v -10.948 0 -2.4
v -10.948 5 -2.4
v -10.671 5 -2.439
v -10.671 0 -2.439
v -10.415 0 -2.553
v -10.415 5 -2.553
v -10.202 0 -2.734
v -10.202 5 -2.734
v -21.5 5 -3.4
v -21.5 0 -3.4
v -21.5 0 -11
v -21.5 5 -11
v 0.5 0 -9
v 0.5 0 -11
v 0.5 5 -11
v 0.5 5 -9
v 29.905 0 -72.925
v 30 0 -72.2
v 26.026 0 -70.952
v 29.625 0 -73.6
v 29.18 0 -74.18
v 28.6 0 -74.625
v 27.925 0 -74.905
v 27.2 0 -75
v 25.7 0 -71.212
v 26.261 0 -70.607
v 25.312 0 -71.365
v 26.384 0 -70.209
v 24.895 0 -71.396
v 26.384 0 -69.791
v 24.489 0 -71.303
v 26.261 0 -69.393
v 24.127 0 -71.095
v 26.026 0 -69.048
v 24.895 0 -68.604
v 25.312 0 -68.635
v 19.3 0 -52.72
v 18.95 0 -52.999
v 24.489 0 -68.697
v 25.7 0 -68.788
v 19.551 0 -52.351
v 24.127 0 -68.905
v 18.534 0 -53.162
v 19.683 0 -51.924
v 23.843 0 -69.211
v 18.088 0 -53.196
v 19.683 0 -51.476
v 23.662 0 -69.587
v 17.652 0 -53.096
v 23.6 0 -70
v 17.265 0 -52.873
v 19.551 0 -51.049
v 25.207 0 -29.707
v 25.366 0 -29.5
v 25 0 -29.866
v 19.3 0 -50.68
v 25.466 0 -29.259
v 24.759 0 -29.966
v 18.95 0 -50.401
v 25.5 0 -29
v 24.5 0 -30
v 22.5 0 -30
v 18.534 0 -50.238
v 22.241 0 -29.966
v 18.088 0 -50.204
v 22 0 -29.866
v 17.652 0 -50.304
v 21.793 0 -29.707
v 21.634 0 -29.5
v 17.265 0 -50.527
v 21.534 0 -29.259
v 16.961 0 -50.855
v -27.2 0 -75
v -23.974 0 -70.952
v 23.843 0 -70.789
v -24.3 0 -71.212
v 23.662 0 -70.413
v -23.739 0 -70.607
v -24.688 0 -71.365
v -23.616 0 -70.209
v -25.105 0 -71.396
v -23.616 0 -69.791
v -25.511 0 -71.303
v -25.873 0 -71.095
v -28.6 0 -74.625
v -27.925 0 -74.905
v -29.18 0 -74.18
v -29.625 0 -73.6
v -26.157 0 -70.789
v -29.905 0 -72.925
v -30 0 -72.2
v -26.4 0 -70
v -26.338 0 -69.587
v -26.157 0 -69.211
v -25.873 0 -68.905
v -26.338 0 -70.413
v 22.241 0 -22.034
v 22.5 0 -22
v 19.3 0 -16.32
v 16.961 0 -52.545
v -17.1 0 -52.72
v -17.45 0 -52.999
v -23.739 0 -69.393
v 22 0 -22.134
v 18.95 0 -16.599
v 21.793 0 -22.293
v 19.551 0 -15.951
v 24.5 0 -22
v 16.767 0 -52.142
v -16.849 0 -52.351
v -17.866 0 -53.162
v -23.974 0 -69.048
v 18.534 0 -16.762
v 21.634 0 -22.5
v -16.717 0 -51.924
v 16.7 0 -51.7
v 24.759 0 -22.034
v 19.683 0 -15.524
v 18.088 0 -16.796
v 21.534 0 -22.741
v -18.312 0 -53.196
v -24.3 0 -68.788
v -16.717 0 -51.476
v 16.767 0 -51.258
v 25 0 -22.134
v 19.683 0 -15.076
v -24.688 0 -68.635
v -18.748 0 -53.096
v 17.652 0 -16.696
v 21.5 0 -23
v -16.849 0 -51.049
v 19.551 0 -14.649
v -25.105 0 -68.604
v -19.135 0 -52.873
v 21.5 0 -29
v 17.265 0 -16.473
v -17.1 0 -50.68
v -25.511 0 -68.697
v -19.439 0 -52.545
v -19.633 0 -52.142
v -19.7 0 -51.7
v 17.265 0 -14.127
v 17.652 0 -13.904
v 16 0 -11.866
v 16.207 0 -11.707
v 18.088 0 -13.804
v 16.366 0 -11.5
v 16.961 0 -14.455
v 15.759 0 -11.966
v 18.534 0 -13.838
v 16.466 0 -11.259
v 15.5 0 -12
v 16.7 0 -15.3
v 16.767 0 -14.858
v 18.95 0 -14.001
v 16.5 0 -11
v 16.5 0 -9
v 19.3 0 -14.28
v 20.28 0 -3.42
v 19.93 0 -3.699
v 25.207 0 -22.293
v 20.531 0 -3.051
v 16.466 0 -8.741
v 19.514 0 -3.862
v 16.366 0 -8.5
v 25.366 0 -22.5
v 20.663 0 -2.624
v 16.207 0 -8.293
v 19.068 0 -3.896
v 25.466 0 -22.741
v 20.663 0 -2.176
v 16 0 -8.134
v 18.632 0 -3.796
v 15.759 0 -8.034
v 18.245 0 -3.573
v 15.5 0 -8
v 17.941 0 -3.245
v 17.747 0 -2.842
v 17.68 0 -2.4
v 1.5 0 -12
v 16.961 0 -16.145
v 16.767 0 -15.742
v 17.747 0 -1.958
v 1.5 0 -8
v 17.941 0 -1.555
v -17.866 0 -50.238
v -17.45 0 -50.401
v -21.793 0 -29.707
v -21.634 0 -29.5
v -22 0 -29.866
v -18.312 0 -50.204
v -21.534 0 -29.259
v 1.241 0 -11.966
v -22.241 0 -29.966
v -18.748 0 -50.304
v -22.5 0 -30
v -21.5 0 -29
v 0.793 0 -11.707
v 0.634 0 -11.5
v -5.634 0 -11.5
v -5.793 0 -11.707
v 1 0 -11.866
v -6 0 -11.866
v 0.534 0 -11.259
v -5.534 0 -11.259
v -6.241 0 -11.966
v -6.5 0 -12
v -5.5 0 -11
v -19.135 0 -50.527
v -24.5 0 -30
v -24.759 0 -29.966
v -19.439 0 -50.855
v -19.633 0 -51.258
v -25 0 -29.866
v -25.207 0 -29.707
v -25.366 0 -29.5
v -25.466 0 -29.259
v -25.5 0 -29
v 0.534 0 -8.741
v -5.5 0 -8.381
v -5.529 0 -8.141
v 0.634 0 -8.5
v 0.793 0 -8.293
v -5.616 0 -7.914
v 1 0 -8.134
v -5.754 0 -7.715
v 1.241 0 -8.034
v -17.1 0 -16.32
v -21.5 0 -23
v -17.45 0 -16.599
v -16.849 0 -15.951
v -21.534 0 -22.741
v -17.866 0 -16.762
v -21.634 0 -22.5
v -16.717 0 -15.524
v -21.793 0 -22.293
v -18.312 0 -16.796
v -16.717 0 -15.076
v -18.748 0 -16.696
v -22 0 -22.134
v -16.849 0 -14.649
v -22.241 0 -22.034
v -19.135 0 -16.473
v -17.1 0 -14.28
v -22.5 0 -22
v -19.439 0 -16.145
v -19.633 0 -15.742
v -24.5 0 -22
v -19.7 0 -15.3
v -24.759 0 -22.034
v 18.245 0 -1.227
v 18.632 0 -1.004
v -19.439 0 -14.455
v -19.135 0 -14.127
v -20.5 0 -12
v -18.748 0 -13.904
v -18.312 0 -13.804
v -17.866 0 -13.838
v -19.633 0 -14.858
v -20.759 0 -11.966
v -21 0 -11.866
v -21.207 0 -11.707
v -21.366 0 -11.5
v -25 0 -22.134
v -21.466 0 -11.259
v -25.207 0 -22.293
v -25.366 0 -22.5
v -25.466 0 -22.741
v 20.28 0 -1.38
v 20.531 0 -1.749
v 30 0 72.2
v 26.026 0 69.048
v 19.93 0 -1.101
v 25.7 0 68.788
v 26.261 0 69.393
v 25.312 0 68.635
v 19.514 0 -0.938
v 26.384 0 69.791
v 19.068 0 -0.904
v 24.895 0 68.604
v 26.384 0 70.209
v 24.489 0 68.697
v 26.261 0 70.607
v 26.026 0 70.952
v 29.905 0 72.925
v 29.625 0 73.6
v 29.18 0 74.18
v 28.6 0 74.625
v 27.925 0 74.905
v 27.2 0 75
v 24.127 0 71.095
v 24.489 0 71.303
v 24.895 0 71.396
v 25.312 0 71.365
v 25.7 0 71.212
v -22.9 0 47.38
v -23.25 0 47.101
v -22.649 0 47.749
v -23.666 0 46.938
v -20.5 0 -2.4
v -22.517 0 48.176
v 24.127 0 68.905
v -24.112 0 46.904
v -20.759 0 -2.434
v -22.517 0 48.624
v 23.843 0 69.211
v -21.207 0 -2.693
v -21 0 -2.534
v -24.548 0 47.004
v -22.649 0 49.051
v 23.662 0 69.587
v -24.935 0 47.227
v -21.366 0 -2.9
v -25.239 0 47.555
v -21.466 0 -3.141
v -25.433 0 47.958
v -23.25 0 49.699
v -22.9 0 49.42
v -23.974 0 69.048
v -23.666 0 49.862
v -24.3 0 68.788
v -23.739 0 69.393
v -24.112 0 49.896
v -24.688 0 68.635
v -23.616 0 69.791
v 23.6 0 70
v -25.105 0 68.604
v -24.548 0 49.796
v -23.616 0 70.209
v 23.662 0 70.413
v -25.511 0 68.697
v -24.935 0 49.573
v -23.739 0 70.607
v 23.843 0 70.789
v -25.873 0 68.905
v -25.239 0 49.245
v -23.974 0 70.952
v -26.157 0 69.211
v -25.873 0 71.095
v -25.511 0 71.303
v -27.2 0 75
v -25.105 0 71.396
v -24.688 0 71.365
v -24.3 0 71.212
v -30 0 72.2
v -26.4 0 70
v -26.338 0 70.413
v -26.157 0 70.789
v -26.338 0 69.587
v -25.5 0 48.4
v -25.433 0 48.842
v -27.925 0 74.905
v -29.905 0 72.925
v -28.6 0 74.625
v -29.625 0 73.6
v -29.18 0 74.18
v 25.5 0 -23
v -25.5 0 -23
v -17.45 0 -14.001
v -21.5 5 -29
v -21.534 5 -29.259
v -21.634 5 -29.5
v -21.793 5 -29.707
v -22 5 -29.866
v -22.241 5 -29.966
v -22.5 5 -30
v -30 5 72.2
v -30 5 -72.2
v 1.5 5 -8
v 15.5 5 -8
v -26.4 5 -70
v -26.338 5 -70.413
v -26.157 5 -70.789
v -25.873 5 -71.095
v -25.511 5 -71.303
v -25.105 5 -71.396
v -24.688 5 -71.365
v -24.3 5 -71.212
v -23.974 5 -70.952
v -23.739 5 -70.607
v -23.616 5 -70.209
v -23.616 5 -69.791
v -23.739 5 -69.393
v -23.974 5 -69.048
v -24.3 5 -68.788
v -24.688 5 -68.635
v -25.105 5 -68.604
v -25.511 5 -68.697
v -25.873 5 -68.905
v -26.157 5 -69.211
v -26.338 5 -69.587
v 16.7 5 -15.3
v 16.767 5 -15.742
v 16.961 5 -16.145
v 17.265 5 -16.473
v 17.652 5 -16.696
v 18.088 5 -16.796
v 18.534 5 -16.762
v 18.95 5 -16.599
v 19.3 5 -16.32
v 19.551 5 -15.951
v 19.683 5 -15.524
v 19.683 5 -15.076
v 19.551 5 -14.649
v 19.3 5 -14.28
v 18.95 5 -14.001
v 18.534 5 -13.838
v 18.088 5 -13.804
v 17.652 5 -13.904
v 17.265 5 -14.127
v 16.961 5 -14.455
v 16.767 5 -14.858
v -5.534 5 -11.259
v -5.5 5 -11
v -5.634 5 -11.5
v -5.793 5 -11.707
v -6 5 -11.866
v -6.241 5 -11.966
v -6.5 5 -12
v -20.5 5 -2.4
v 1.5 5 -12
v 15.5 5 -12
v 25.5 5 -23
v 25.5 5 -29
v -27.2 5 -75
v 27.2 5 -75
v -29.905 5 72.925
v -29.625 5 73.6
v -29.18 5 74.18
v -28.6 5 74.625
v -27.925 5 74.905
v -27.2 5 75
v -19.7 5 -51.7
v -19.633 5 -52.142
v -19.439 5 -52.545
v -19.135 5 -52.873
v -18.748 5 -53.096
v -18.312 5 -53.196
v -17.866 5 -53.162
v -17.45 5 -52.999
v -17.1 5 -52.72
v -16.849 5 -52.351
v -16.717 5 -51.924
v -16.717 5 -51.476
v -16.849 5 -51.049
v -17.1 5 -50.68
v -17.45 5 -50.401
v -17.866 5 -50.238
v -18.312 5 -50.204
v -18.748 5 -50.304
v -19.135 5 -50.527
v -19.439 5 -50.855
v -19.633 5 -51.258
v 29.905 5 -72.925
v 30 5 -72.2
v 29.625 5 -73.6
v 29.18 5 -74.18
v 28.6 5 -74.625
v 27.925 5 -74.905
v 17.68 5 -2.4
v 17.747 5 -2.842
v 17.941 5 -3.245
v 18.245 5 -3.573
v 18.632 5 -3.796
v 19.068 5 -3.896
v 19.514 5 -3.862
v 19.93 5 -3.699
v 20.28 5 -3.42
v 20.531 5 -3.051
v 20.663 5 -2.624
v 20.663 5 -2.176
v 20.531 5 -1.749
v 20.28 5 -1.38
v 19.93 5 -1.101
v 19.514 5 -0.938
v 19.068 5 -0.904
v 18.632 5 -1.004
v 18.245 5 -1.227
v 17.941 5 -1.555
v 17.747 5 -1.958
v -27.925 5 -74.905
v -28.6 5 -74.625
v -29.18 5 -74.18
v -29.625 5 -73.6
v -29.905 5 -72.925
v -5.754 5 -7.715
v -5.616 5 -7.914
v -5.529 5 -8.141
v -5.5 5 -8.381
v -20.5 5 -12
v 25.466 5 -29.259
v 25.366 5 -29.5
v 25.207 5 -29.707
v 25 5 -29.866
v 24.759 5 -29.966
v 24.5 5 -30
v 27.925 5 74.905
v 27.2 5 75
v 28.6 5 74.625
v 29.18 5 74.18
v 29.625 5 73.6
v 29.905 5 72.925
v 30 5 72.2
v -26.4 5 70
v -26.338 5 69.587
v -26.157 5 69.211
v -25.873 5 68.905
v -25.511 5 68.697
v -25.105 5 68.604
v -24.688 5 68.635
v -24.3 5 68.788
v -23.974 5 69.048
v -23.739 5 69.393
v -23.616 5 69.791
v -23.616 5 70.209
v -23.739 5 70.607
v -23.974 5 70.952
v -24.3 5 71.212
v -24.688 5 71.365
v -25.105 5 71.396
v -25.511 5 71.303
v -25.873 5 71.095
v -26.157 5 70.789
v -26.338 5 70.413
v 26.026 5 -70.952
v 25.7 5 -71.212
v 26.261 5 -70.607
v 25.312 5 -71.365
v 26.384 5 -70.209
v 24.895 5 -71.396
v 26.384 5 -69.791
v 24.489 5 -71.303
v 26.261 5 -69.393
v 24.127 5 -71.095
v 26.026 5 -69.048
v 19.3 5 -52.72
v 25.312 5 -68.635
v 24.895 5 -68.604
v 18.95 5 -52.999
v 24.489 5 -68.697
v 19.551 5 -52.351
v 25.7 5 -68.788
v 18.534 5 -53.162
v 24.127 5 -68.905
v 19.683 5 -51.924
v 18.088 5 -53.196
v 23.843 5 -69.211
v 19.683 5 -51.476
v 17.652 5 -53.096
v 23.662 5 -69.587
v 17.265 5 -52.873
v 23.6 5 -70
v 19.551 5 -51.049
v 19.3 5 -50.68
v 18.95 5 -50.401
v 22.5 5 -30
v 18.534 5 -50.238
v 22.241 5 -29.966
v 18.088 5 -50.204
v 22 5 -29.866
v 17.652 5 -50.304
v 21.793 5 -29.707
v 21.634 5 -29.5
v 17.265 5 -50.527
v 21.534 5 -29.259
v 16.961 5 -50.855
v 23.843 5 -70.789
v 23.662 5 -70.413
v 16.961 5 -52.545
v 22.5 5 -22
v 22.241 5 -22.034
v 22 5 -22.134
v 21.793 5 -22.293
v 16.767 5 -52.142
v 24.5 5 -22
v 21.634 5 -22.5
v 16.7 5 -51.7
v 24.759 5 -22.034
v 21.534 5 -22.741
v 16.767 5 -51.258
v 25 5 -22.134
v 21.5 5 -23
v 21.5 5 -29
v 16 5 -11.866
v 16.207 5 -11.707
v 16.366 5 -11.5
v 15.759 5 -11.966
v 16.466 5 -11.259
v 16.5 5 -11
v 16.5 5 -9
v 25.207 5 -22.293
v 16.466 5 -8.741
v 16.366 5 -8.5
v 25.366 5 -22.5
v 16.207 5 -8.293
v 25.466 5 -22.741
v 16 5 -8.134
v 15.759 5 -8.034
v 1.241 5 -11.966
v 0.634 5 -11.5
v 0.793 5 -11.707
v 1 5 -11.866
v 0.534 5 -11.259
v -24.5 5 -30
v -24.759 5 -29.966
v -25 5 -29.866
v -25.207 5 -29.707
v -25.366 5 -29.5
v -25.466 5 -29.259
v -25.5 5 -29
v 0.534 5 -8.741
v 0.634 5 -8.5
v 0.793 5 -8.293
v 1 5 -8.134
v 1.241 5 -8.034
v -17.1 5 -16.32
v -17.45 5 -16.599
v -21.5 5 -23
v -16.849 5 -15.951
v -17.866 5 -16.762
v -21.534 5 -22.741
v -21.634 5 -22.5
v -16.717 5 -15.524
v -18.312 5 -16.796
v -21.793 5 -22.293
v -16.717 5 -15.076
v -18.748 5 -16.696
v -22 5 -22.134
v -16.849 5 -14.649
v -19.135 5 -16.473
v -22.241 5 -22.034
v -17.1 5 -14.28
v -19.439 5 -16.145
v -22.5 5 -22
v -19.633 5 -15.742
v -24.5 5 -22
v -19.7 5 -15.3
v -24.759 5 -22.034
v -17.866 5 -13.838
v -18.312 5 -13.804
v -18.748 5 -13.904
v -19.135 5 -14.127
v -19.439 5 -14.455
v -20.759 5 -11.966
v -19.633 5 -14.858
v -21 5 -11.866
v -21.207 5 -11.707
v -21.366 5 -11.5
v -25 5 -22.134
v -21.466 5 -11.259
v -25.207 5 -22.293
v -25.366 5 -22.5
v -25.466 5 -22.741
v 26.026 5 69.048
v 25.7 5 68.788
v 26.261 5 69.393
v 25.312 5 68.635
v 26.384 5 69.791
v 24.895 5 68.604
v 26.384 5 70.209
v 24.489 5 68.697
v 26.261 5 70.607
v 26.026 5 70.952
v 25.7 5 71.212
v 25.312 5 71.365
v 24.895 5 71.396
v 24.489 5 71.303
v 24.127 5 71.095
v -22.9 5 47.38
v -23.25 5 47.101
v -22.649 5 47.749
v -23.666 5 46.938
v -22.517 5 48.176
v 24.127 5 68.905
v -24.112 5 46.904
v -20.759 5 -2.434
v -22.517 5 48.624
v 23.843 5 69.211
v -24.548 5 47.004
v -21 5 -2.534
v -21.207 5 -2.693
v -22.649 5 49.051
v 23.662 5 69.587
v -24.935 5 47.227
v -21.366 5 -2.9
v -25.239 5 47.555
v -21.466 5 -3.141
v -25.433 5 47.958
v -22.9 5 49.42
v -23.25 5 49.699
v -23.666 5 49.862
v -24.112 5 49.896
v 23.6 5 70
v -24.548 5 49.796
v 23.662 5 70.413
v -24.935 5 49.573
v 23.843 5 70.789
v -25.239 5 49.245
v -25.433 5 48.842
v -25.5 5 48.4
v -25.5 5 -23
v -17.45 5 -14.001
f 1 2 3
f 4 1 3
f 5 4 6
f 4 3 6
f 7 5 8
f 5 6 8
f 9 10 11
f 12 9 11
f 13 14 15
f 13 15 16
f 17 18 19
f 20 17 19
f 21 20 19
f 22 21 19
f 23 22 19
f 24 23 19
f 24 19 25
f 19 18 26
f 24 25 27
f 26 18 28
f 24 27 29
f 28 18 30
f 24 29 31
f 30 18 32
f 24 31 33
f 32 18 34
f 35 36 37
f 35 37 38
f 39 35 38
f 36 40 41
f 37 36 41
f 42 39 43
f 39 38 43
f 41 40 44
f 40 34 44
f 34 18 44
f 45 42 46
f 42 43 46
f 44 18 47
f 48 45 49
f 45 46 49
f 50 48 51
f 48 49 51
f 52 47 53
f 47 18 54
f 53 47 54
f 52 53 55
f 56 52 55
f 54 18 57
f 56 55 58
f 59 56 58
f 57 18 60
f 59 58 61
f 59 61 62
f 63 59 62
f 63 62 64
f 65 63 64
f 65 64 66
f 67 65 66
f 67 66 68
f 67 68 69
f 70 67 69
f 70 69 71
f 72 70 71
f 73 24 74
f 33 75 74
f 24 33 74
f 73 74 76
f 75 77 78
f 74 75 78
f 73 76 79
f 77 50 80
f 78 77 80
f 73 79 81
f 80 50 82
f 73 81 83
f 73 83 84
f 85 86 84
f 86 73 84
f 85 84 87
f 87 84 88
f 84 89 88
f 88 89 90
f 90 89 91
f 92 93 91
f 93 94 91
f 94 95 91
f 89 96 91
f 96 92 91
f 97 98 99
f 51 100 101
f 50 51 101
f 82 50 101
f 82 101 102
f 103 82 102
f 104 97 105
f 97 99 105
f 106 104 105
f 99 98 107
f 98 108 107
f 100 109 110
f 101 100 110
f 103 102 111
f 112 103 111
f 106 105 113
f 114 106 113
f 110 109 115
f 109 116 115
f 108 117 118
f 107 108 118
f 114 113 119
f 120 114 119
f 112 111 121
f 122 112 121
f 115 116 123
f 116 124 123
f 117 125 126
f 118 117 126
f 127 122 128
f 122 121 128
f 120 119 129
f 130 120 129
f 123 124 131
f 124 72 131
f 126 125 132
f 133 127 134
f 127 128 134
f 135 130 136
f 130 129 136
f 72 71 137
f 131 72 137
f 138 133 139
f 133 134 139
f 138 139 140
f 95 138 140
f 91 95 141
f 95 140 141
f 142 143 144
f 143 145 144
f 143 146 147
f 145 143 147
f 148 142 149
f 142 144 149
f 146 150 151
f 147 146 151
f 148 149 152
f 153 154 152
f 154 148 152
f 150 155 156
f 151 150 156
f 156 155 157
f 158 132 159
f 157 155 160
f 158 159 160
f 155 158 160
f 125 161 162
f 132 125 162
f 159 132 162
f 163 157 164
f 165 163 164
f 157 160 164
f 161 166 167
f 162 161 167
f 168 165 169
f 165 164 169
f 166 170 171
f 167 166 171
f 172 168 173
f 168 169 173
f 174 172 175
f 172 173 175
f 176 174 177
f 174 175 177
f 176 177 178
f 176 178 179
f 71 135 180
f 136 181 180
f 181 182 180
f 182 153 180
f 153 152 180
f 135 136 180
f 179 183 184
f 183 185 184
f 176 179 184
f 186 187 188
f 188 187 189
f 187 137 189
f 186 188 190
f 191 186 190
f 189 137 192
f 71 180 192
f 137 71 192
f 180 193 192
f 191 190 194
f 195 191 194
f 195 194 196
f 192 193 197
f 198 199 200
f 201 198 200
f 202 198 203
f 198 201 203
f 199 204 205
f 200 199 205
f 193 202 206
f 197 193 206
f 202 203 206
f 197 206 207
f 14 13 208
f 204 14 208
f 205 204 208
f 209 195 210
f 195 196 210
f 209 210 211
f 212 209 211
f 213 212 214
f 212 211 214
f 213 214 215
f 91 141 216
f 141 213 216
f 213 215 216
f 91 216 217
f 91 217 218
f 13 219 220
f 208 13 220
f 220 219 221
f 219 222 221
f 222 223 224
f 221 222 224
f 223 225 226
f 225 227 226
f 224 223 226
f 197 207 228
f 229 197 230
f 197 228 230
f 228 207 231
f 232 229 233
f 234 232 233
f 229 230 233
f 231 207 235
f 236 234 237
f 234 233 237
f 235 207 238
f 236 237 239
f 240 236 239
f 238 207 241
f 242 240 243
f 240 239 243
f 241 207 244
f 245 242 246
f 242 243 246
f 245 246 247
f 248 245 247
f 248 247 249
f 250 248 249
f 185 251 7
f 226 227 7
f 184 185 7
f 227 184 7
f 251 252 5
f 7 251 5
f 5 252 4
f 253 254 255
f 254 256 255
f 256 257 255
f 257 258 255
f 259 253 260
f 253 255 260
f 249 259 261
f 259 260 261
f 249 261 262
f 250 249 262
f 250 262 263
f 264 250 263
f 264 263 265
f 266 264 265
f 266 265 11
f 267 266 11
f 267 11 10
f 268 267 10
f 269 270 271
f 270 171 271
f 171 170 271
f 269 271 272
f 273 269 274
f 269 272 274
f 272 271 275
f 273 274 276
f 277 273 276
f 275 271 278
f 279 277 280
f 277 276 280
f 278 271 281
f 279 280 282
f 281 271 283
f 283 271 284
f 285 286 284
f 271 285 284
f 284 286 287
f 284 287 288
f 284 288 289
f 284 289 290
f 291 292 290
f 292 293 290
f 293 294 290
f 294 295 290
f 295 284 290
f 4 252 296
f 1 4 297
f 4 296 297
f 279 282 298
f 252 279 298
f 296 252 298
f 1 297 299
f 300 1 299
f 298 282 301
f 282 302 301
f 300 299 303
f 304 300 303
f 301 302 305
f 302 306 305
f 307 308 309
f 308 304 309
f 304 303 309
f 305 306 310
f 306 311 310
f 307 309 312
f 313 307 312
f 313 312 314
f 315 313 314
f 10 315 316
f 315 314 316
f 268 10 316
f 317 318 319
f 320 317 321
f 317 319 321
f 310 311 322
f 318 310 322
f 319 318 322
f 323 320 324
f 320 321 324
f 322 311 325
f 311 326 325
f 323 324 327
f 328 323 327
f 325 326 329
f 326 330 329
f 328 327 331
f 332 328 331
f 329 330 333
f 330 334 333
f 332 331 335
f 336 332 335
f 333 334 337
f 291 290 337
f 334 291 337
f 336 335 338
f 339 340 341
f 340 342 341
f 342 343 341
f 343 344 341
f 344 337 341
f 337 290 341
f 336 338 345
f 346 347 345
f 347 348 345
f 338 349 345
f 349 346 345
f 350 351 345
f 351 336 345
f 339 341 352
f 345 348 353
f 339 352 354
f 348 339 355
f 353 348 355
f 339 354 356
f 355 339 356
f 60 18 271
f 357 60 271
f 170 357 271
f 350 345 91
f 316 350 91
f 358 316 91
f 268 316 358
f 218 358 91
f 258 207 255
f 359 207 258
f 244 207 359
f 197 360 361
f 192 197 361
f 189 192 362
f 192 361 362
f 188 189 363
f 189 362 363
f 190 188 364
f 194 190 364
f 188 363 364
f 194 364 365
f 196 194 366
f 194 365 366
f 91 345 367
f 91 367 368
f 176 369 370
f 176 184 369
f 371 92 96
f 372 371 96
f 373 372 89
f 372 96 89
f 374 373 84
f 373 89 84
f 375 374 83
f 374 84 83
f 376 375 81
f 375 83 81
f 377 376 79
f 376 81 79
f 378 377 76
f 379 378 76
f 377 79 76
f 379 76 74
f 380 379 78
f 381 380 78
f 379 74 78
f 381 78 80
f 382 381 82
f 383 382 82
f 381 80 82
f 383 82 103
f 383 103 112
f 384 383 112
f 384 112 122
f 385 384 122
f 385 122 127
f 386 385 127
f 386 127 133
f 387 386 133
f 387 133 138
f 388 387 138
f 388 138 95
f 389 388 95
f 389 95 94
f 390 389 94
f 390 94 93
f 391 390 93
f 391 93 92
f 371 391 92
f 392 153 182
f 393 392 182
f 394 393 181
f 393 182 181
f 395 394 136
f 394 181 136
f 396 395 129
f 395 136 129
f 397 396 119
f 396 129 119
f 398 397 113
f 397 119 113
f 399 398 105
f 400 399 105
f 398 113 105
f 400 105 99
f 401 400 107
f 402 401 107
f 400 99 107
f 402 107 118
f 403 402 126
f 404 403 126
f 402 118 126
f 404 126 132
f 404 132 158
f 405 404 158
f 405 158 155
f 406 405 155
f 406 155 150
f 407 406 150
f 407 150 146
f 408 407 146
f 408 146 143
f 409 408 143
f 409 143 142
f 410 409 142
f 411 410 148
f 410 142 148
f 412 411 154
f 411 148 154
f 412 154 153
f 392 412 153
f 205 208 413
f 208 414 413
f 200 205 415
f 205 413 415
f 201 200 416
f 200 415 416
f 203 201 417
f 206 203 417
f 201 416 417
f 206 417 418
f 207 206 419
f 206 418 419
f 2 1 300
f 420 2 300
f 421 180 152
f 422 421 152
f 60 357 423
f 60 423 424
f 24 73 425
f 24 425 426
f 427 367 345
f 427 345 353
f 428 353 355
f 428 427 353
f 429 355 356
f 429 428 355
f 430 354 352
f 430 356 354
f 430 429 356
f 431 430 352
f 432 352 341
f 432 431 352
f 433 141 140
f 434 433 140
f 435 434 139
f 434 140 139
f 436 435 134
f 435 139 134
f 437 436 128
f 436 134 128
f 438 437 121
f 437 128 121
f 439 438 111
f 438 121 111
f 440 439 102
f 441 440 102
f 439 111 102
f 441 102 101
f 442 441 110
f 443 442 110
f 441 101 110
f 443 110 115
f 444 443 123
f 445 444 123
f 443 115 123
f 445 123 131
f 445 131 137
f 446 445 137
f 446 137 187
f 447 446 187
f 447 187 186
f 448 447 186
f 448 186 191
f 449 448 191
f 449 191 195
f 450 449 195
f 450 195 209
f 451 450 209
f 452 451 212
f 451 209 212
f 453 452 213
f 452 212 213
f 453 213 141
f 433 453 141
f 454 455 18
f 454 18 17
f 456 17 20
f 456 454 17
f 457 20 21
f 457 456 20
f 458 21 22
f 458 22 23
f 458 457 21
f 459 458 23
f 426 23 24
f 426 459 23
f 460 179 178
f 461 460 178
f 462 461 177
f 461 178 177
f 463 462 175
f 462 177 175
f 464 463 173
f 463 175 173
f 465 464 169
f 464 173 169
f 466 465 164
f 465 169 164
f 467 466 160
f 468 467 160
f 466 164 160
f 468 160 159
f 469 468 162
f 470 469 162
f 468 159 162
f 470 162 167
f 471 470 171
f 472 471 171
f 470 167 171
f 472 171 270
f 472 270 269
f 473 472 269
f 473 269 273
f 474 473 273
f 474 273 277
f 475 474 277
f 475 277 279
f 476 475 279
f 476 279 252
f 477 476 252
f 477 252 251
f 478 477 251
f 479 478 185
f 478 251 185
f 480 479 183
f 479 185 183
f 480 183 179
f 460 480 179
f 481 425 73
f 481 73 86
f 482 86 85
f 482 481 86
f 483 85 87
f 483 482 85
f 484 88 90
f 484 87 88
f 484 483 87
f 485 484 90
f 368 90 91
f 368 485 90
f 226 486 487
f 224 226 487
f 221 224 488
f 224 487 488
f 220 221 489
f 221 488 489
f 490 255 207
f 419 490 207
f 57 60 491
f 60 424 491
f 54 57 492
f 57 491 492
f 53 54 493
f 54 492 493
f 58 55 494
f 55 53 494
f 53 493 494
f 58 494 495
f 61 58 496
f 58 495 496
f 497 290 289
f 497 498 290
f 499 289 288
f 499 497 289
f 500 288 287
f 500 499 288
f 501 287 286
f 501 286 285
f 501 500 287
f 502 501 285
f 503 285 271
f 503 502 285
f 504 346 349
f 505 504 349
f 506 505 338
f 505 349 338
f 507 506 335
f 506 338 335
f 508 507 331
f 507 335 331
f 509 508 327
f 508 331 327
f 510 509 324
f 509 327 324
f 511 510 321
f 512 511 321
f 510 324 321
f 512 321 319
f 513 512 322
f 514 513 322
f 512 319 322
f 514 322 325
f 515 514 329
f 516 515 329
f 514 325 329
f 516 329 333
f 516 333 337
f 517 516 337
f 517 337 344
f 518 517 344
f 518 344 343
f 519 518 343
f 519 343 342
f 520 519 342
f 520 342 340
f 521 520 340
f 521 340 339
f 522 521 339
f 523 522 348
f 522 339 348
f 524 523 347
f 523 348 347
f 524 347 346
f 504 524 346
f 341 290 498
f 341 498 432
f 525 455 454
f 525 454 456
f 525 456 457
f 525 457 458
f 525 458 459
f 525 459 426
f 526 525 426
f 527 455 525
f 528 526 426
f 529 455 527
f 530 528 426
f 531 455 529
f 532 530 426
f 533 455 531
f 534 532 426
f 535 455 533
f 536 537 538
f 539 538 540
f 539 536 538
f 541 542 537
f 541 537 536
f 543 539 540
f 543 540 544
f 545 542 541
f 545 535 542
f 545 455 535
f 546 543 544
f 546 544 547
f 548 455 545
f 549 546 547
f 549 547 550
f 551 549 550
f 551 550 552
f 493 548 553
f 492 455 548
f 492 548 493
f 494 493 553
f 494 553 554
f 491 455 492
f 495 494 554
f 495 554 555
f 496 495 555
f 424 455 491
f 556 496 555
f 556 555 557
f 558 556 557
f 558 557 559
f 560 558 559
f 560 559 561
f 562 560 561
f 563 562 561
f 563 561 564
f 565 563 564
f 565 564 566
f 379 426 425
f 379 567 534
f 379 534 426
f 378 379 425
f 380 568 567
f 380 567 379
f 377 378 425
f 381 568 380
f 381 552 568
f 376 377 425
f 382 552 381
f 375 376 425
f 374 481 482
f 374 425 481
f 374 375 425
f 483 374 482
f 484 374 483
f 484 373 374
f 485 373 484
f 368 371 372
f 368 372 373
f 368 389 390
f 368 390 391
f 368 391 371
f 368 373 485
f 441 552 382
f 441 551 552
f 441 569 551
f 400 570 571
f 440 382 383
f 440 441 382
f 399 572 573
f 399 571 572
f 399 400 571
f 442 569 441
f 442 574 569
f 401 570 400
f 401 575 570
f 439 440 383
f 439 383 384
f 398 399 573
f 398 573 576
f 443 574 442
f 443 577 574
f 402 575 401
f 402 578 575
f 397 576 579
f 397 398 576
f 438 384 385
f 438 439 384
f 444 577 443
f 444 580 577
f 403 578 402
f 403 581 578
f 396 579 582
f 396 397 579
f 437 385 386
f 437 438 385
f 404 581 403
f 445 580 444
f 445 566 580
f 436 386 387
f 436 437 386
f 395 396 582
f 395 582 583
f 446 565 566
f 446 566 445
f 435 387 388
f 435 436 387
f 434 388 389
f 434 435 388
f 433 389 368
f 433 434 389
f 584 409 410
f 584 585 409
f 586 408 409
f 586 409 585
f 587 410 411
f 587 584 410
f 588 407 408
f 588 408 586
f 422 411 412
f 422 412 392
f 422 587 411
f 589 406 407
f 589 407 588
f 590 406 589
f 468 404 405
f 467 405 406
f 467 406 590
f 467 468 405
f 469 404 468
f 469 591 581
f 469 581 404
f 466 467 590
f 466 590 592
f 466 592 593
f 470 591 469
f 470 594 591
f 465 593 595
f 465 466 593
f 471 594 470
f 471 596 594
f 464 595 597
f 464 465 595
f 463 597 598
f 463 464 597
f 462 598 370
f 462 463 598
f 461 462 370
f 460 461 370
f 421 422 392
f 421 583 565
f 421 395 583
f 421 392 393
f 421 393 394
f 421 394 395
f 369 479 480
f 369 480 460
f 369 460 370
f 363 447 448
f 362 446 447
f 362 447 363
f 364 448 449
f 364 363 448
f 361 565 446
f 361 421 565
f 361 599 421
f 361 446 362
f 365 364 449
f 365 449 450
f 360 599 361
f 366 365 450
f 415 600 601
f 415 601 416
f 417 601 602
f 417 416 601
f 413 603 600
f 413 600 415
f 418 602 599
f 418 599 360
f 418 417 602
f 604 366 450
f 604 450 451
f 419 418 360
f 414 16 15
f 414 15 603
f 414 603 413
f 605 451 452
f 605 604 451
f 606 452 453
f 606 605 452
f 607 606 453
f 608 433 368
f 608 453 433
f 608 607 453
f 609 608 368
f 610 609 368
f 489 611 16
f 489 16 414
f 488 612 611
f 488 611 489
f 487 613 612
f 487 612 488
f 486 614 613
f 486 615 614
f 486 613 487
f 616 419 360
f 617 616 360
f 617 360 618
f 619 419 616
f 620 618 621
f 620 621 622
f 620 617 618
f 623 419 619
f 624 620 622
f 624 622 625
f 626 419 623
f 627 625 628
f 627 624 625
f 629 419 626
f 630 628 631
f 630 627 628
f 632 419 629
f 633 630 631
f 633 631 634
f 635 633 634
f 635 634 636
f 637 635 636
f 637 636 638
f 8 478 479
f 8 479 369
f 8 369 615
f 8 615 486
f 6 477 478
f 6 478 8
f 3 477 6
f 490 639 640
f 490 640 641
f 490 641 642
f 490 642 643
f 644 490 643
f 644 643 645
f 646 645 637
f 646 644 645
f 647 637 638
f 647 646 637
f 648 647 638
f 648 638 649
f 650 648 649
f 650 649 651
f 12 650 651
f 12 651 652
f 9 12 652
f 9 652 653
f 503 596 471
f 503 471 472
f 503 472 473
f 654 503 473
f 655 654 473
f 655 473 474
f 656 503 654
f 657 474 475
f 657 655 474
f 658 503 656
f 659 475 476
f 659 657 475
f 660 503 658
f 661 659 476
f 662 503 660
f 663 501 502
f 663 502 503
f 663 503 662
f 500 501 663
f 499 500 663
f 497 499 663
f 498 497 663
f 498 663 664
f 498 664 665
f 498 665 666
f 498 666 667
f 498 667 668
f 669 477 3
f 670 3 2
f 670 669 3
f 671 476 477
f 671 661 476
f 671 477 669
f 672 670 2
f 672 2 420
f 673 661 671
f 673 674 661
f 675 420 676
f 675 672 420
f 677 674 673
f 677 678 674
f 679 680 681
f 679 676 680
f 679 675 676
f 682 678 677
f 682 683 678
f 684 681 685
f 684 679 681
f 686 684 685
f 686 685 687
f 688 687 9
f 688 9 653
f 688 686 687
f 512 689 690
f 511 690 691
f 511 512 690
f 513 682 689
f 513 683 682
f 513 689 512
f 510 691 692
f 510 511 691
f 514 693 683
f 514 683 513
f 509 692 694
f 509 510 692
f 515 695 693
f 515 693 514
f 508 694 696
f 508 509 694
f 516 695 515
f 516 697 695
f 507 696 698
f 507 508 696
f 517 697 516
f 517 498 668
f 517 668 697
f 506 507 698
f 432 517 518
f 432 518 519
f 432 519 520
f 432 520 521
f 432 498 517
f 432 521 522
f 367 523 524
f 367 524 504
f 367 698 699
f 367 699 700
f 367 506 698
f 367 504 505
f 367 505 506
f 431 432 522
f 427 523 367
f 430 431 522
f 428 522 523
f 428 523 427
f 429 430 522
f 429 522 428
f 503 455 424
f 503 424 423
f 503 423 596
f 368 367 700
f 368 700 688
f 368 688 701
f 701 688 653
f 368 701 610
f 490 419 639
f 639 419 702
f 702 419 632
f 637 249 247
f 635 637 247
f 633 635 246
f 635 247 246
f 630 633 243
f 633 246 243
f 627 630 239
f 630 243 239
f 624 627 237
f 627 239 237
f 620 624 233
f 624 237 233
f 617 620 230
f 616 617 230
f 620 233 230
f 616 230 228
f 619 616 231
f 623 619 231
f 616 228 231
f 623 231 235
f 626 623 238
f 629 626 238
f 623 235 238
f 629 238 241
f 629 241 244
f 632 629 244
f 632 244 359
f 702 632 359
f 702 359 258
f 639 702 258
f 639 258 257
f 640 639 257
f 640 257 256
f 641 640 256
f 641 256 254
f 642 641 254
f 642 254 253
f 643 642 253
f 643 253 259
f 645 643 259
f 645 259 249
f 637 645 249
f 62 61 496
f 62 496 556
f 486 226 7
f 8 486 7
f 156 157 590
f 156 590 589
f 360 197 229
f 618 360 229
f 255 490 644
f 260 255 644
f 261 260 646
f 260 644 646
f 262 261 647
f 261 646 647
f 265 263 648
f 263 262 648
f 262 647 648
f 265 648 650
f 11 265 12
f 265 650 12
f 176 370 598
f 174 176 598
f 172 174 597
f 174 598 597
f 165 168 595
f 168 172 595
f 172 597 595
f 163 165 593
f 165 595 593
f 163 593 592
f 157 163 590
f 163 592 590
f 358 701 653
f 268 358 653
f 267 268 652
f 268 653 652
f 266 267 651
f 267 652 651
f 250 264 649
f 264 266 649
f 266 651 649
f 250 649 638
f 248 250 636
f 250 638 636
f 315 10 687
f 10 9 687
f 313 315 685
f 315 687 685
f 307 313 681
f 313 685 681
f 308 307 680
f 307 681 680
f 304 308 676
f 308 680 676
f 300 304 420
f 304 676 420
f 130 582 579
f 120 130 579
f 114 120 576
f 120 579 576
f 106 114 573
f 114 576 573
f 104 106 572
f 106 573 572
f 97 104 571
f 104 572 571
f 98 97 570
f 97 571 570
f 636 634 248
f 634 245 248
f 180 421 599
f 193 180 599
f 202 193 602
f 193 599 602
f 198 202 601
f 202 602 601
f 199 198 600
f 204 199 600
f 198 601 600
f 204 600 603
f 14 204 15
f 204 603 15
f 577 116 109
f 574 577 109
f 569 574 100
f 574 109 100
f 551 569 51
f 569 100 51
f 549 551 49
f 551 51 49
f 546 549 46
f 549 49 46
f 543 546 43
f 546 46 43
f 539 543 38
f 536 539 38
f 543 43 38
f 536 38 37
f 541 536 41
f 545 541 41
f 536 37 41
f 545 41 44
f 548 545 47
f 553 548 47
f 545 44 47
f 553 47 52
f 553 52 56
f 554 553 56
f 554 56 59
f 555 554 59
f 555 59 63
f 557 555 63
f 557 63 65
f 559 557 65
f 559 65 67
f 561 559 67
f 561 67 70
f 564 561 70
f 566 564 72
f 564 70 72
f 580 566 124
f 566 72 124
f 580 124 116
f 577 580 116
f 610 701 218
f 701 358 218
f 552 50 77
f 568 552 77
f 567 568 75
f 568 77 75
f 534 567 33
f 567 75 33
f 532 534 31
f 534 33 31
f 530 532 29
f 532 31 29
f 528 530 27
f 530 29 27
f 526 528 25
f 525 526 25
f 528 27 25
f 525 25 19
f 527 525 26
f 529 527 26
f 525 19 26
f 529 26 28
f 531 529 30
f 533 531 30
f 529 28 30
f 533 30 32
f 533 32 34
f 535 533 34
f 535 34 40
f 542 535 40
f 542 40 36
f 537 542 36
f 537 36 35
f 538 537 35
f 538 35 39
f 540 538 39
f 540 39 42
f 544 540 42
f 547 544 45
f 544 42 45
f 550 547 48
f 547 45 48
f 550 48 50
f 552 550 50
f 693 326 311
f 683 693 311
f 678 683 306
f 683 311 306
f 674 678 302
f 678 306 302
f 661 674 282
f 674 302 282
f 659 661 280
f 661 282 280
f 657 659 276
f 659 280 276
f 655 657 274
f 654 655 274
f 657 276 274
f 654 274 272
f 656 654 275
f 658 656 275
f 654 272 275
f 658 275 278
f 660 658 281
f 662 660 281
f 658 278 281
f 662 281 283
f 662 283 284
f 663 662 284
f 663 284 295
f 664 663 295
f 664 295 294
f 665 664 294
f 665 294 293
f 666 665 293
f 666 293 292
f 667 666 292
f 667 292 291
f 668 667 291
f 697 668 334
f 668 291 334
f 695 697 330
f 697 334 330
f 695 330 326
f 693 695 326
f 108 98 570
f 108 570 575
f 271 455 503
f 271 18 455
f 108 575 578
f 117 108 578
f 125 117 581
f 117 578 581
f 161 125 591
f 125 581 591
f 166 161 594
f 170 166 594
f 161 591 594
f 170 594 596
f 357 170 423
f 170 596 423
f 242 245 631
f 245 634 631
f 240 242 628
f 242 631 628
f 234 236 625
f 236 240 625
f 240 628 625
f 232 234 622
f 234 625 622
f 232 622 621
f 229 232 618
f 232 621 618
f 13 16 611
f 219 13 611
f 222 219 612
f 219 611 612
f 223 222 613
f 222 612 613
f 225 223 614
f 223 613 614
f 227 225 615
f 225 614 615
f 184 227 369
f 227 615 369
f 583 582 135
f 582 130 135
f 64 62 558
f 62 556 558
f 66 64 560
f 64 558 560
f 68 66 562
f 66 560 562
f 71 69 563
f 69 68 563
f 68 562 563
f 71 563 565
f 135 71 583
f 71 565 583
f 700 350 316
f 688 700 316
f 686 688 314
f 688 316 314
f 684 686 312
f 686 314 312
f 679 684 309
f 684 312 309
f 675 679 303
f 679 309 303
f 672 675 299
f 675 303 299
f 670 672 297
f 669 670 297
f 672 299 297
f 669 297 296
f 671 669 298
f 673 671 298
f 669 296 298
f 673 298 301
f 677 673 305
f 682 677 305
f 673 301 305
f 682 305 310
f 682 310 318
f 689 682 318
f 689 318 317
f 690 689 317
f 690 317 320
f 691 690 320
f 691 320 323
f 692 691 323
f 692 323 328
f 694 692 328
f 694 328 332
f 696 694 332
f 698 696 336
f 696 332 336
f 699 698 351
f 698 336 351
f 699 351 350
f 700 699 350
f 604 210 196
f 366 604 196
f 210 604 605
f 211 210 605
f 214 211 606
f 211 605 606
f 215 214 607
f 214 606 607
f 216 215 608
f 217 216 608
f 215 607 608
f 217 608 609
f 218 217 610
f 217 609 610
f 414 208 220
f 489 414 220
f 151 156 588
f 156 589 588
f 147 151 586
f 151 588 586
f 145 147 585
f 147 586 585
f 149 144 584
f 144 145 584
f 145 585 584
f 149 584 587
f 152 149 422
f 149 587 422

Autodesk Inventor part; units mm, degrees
ref_plane "YZ Plane" through (0, 0, 0) normal (1, 0, 0) x (0, 1, 0)
ref_plane "XZ Plane" through (0, 0, 0) normal (0, 1, 0) x (-1, 0, 0)
ref_plane "XY Plane" through (0, 0, 0) normal (0, 0, 1) x (1, 0, 0)
sketch "Sketch1" plane through (0, 0, 0) normal (0, 1, 0) x (-1, 0, 0)
  line L0 (-30, 75) -> (30, 75)
  line L1 (30, 75) -> (30, -75)
  line L2 (30, -75) -> (-30, -75)
  line L3 (-30, -75) -> (-30, 75)
  line L4 (-30, 75) -> (30, -75) construction
  line L5 (30, 75) -> (-30, -75) construction
  line L6 (30, 75) -> (25, 75)
  line L7 (25, 75) -> (25, 70)
  line L8 (25, 70) -> (30, 70)
  line L9 (30, 70) -> (30, 75)
  line L10 (-30, 75) -> (-25, 75)
  line L11 (-25, 75) -> (-25, 70)
  line L12 (-25, 70) -> (-30, 70)
  line L13 (-30, 70) -> (-30, 75)
  line L14 (30, -75) -> (25, -75)
  line L15 (25, -75) -> (25, -70)
  line L16 (25, -70) -> (30, -70)
  line L17 (30, -70) -> (30, -75)
  line L18 (-30, -75) -> (-25, -75)
  line L19 (-25, -75) -> (-25, -70)
  line L20 (-25, -70) -> (-30, -70)
  line L21 (-30, -70) -> (-30, -75)
  circle A0 centre (25, 70) radius 1.4
  circle A1 centre (-25, 70) radius 1.4
  circle A2 centre (25, -70) radius 1.4
  circle A3 centre (-25, -70) radius 1.4
  line L22 (30, -75) -> (-30, -75)
  line L23 (-30, -75) -> (-30, -55)
  line L24 (-30, -55) -> (30, -55)
  line L25 (30, -55) -> (30, -75)
  line L26 (0, -55) -> (21.5, -55)
  line L27 (21.5, -55) -> (21.5, -12)
  line L28 (21.5, -12) -> (0, -12)
  line L29 (0, -12) -> (0, -55)
  line L30 (0, -12) -> (-21.5, -12)
  line L31 (-21.5, -12) -> (-21.5, -55)
  line L32 (-21.5, -55) -> (0, -55)
  line L33 (0, -55) -> (0, -12)
  line L34 (0, -12) -> (0, -33.5)
  line L35 (-18.2, -15.3) -> (18.2, -15.3)
  line L36 (18.2, -15.3) -> (18.2, -51.7)
  line L37 (18.2, -51.7) -> (-18.2, -51.7)
  line L38 (-18.2, -51.7) -> (-18.2, -15.3)
  line L39 (-18.2, -15.3) -> (18.2, -51.7) construction
  line L40 (18.2, -15.3) -> (-18.2, -51.7) construction
  circle A4 centre (18.2, -15.3) radius 1.5
  circle A5 centre (18.2, -51.7) radius 1.5
  circle A6 centre (-18.2, -15.3) radius 1.5
  circle A7 centre (-18.2, -51.7) radius 1.5
  line L41 (-30, 75) -> (-19.18, 75)
  line L42 (-19.18, 75) -> (-19.18, -2.4)
  line L43 (-19.18, -2.4) -> (-30, -2.4)
  line L44 (-30, -2.4) -> (-30, 75)
  line L45 (30, 75) -> (24, 75)
  line L46 (24, 75) -> (24, 48.4)
  line L47 (24, 48.4) -> (30, 48.4)
  line L48 (30, 48.4) -> (30, 75)
  circle A8 centre (24, 48.4) radius 1.5
  circle A9 centre (-19.18, -2.4) radius 1.5
  line L49 (-21.5, -12) -> (-21.5, -22)
  line L50 (-21.5, -22) -> (-25.5, -22)
  line L51 (-25.5, -22) -> (-25.5, -30)
  line L52 (-25.5, -30) -> (-21.5, -30)
  line L53 (-21.5, -30) -> (-21.5, -22)
  line L54 (21.5, -22) -> (25.5, -22)
  line L55 (25.5, -22) -> (25.5, -30)
  line L56 (25.5, -30) -> (21.5, -30)
  line L57 (21.5, -30) -> (21.5, -22)
  line L58 (21.5, -12) -> (15.5, -12)
  line L59 (15.5, -12) -> (5.5, -12)
  line L60 (5.5, -12) -> (5.5, -8)
  line L61 (5.5, -8) -> (15.5, -8)
  line L62 (15.5, -8) -> (15.5, -12)
  line L63 (-21.5, -12) -> (-16.5, -12)
  line L64 (-16.5, -12) -> (-0.5, -12)
  line L65 (-0.5, -12) -> (-0.5, -8)
  line L66 (-0.5, -8) -> (-16.5, -8)
  line L67 (-16.5, -8) -> (-16.5, -12)
  line L68 (21.5, -12) -> (10.5, -12)
  line L69 (10.5, -12) -> (10.5, -2.4)
  line L70 (10.5, -2.4) -> (21.5, -2.4)
  line L71 (21.5, -2.4) -> (21.5, -12)
  line L72 (5.5, -8) -> (10.5, -2.4)
  point P0 (10.5, -8)
  dimension "d10" = 60
  dimension "d11" = 150
  dimension "d12" = 5
  dimension "d13" = 5
  dimension "d14" = 5
  dimension "d15" = 5
  dimension "d16" = 5
  dimension "d17" = 5
  dimension "d18" = 5
  dimension "d19" = 5
  dimension "d20" = 2.8
  dimension "d21" = 2.8
  dimension "d22" = 2.8
  dimension "d23" = 2.8
  dimension "d28" = 20
  dimension "d29" = 21.5
  dimension "d30" = 43
  dimension "d31" = 21.5
  dimension "d32" = 36.4
  dimension "d33" = 36.4
  dimension "d34" = 3
  dimension "d35" = 3
  dimension "d36" = 3
  dimension "d37" = 3
  dimension "d38" = 10.82
  dimension "d39" = 77.4
  dimension "d40" = 6
  dimension "d41" = 26.6
  dimension "d42" = 3
  dimension "d43" = 3
  dimension "d48" = 10
  dimension "d49" = 4
  dimension "d50" = 8
  dimension "d51" = 4
  dimension "d52" = 8
  dimension "d53" = 6
  dimension "d54" = 10
  dimension "d55" = 4
  dimension "d56" = 5
  dimension "d57" = 16
  dimension "d58" = 4
extrude "Extrusion1" add sketch "Sketch1" along normal blind 5 contours L0 L11 A1 L12 L3 | L0 L42 A9 L43 L3 L12 A1 L11 | L0 L46 A0 A8 L47 L1 L24 L27 L56 L55 L54 L71 L70 L72 L60 L28 L30 L65 L66 L67 L31 L50 L51 L52 L3 L43 A9 L42 | L0 L7 A0 L46 | A9 L43 L42 | L42 L43 A9 | L24 L1 L16 A2 L15 L2 L19 A3 L20 L3 | L0 L1 L8 A0 L7 | L20 A3 L19 L2 L3 | L31 L30 L29 L35 A6 L38 A7 L37 L24 | A0 L8 L1 L47 A8 L46 | L29 L37 A5 L36 A4 L35 L28 L27 L24 | L52 L51 L50 L31 | A8 L47 L46 | L46 L47 A8 | L37 A7 L38 A6 L35 L29 | L29 L35 A4 L36 A5 L37 | L15 A2 L16 L1 L2 | L27 L54 L55 L56 | A5 L36 L37 | L37 L36 A5 | A7 L38 L37 | L37 L38 A7 | L67 L66 L65 L30 | L28 L62 L61 L69 L70 L71 | A6 L38 L35 | L35 L38 A6 | A4 L36 L35 | L35 L36 A4 | L28 L69 L61 L62 | L60 L61 L69 L28 | L69 L61 L72
fillet "Fillet1" radius 2.8 1 edges at (30, 2.5, 75)
fillet "Fillet2" radius 2.8 3 edges at (-30, 2.5, 75) (-30, 2.5, -75) (30, 2.5, -75)
extrude "Extrusion2" cut sketch "Sketch1" along normal blind 10 contours A8 L47 L46 | L46 L47 A8 | A5 L36 L37 | L37 L36 A5 | A7 L38 L37 | L37 L38 A7 | A6 L38 L35 | L35 L38 A6 | A4 L36 L35 | L35 L36 A4
extrude "Extrusion3" cut sketch "Sketch1" along normal blind 10 contours A9 L43 L42 | L42 L43 A9
extrude "Extrusion4" cut sketch "Sketch1" along normal blind 10 contours L52 L51 L50 L31 | L27 L54 L55 L56 | L67 L66 L65 L30 | L28 L69 L61 L62 | L60 L61 L69 L28
extrude "Extrusion5" cut sketch "Sketch1" along normal blind 10 contours L28 L62 L61 L69 L70 L71
extrude "Extrusion6" cut sketch "Sketch1" along normal blind 10 contours L69 L61 L72
fillet "Fillet3" radius 1 17 edges at (-5.5, 2.5, -8) (-10.5, 2.5, -2.4) (-21.5, 2.5, -2.4) (-21.5, 2.5, -12) (-5.5, 2.5, -12) (0.5, 2.5, -8) (0.5, 2.5, -12) (16.5, 2.5, -12) (16.5, 2.5, -8) (25.5, 2.5, -22) (21.5, 2.5, -22) (25.5, 2.5, -30) (21.5, 2.5, -30) (-25.5, 2.5, -30) (-25.5, 2.5, -22) (-21.5, 2.5, -22) (-21.5, 2.5, -30)
properties part number "DeGiua"
